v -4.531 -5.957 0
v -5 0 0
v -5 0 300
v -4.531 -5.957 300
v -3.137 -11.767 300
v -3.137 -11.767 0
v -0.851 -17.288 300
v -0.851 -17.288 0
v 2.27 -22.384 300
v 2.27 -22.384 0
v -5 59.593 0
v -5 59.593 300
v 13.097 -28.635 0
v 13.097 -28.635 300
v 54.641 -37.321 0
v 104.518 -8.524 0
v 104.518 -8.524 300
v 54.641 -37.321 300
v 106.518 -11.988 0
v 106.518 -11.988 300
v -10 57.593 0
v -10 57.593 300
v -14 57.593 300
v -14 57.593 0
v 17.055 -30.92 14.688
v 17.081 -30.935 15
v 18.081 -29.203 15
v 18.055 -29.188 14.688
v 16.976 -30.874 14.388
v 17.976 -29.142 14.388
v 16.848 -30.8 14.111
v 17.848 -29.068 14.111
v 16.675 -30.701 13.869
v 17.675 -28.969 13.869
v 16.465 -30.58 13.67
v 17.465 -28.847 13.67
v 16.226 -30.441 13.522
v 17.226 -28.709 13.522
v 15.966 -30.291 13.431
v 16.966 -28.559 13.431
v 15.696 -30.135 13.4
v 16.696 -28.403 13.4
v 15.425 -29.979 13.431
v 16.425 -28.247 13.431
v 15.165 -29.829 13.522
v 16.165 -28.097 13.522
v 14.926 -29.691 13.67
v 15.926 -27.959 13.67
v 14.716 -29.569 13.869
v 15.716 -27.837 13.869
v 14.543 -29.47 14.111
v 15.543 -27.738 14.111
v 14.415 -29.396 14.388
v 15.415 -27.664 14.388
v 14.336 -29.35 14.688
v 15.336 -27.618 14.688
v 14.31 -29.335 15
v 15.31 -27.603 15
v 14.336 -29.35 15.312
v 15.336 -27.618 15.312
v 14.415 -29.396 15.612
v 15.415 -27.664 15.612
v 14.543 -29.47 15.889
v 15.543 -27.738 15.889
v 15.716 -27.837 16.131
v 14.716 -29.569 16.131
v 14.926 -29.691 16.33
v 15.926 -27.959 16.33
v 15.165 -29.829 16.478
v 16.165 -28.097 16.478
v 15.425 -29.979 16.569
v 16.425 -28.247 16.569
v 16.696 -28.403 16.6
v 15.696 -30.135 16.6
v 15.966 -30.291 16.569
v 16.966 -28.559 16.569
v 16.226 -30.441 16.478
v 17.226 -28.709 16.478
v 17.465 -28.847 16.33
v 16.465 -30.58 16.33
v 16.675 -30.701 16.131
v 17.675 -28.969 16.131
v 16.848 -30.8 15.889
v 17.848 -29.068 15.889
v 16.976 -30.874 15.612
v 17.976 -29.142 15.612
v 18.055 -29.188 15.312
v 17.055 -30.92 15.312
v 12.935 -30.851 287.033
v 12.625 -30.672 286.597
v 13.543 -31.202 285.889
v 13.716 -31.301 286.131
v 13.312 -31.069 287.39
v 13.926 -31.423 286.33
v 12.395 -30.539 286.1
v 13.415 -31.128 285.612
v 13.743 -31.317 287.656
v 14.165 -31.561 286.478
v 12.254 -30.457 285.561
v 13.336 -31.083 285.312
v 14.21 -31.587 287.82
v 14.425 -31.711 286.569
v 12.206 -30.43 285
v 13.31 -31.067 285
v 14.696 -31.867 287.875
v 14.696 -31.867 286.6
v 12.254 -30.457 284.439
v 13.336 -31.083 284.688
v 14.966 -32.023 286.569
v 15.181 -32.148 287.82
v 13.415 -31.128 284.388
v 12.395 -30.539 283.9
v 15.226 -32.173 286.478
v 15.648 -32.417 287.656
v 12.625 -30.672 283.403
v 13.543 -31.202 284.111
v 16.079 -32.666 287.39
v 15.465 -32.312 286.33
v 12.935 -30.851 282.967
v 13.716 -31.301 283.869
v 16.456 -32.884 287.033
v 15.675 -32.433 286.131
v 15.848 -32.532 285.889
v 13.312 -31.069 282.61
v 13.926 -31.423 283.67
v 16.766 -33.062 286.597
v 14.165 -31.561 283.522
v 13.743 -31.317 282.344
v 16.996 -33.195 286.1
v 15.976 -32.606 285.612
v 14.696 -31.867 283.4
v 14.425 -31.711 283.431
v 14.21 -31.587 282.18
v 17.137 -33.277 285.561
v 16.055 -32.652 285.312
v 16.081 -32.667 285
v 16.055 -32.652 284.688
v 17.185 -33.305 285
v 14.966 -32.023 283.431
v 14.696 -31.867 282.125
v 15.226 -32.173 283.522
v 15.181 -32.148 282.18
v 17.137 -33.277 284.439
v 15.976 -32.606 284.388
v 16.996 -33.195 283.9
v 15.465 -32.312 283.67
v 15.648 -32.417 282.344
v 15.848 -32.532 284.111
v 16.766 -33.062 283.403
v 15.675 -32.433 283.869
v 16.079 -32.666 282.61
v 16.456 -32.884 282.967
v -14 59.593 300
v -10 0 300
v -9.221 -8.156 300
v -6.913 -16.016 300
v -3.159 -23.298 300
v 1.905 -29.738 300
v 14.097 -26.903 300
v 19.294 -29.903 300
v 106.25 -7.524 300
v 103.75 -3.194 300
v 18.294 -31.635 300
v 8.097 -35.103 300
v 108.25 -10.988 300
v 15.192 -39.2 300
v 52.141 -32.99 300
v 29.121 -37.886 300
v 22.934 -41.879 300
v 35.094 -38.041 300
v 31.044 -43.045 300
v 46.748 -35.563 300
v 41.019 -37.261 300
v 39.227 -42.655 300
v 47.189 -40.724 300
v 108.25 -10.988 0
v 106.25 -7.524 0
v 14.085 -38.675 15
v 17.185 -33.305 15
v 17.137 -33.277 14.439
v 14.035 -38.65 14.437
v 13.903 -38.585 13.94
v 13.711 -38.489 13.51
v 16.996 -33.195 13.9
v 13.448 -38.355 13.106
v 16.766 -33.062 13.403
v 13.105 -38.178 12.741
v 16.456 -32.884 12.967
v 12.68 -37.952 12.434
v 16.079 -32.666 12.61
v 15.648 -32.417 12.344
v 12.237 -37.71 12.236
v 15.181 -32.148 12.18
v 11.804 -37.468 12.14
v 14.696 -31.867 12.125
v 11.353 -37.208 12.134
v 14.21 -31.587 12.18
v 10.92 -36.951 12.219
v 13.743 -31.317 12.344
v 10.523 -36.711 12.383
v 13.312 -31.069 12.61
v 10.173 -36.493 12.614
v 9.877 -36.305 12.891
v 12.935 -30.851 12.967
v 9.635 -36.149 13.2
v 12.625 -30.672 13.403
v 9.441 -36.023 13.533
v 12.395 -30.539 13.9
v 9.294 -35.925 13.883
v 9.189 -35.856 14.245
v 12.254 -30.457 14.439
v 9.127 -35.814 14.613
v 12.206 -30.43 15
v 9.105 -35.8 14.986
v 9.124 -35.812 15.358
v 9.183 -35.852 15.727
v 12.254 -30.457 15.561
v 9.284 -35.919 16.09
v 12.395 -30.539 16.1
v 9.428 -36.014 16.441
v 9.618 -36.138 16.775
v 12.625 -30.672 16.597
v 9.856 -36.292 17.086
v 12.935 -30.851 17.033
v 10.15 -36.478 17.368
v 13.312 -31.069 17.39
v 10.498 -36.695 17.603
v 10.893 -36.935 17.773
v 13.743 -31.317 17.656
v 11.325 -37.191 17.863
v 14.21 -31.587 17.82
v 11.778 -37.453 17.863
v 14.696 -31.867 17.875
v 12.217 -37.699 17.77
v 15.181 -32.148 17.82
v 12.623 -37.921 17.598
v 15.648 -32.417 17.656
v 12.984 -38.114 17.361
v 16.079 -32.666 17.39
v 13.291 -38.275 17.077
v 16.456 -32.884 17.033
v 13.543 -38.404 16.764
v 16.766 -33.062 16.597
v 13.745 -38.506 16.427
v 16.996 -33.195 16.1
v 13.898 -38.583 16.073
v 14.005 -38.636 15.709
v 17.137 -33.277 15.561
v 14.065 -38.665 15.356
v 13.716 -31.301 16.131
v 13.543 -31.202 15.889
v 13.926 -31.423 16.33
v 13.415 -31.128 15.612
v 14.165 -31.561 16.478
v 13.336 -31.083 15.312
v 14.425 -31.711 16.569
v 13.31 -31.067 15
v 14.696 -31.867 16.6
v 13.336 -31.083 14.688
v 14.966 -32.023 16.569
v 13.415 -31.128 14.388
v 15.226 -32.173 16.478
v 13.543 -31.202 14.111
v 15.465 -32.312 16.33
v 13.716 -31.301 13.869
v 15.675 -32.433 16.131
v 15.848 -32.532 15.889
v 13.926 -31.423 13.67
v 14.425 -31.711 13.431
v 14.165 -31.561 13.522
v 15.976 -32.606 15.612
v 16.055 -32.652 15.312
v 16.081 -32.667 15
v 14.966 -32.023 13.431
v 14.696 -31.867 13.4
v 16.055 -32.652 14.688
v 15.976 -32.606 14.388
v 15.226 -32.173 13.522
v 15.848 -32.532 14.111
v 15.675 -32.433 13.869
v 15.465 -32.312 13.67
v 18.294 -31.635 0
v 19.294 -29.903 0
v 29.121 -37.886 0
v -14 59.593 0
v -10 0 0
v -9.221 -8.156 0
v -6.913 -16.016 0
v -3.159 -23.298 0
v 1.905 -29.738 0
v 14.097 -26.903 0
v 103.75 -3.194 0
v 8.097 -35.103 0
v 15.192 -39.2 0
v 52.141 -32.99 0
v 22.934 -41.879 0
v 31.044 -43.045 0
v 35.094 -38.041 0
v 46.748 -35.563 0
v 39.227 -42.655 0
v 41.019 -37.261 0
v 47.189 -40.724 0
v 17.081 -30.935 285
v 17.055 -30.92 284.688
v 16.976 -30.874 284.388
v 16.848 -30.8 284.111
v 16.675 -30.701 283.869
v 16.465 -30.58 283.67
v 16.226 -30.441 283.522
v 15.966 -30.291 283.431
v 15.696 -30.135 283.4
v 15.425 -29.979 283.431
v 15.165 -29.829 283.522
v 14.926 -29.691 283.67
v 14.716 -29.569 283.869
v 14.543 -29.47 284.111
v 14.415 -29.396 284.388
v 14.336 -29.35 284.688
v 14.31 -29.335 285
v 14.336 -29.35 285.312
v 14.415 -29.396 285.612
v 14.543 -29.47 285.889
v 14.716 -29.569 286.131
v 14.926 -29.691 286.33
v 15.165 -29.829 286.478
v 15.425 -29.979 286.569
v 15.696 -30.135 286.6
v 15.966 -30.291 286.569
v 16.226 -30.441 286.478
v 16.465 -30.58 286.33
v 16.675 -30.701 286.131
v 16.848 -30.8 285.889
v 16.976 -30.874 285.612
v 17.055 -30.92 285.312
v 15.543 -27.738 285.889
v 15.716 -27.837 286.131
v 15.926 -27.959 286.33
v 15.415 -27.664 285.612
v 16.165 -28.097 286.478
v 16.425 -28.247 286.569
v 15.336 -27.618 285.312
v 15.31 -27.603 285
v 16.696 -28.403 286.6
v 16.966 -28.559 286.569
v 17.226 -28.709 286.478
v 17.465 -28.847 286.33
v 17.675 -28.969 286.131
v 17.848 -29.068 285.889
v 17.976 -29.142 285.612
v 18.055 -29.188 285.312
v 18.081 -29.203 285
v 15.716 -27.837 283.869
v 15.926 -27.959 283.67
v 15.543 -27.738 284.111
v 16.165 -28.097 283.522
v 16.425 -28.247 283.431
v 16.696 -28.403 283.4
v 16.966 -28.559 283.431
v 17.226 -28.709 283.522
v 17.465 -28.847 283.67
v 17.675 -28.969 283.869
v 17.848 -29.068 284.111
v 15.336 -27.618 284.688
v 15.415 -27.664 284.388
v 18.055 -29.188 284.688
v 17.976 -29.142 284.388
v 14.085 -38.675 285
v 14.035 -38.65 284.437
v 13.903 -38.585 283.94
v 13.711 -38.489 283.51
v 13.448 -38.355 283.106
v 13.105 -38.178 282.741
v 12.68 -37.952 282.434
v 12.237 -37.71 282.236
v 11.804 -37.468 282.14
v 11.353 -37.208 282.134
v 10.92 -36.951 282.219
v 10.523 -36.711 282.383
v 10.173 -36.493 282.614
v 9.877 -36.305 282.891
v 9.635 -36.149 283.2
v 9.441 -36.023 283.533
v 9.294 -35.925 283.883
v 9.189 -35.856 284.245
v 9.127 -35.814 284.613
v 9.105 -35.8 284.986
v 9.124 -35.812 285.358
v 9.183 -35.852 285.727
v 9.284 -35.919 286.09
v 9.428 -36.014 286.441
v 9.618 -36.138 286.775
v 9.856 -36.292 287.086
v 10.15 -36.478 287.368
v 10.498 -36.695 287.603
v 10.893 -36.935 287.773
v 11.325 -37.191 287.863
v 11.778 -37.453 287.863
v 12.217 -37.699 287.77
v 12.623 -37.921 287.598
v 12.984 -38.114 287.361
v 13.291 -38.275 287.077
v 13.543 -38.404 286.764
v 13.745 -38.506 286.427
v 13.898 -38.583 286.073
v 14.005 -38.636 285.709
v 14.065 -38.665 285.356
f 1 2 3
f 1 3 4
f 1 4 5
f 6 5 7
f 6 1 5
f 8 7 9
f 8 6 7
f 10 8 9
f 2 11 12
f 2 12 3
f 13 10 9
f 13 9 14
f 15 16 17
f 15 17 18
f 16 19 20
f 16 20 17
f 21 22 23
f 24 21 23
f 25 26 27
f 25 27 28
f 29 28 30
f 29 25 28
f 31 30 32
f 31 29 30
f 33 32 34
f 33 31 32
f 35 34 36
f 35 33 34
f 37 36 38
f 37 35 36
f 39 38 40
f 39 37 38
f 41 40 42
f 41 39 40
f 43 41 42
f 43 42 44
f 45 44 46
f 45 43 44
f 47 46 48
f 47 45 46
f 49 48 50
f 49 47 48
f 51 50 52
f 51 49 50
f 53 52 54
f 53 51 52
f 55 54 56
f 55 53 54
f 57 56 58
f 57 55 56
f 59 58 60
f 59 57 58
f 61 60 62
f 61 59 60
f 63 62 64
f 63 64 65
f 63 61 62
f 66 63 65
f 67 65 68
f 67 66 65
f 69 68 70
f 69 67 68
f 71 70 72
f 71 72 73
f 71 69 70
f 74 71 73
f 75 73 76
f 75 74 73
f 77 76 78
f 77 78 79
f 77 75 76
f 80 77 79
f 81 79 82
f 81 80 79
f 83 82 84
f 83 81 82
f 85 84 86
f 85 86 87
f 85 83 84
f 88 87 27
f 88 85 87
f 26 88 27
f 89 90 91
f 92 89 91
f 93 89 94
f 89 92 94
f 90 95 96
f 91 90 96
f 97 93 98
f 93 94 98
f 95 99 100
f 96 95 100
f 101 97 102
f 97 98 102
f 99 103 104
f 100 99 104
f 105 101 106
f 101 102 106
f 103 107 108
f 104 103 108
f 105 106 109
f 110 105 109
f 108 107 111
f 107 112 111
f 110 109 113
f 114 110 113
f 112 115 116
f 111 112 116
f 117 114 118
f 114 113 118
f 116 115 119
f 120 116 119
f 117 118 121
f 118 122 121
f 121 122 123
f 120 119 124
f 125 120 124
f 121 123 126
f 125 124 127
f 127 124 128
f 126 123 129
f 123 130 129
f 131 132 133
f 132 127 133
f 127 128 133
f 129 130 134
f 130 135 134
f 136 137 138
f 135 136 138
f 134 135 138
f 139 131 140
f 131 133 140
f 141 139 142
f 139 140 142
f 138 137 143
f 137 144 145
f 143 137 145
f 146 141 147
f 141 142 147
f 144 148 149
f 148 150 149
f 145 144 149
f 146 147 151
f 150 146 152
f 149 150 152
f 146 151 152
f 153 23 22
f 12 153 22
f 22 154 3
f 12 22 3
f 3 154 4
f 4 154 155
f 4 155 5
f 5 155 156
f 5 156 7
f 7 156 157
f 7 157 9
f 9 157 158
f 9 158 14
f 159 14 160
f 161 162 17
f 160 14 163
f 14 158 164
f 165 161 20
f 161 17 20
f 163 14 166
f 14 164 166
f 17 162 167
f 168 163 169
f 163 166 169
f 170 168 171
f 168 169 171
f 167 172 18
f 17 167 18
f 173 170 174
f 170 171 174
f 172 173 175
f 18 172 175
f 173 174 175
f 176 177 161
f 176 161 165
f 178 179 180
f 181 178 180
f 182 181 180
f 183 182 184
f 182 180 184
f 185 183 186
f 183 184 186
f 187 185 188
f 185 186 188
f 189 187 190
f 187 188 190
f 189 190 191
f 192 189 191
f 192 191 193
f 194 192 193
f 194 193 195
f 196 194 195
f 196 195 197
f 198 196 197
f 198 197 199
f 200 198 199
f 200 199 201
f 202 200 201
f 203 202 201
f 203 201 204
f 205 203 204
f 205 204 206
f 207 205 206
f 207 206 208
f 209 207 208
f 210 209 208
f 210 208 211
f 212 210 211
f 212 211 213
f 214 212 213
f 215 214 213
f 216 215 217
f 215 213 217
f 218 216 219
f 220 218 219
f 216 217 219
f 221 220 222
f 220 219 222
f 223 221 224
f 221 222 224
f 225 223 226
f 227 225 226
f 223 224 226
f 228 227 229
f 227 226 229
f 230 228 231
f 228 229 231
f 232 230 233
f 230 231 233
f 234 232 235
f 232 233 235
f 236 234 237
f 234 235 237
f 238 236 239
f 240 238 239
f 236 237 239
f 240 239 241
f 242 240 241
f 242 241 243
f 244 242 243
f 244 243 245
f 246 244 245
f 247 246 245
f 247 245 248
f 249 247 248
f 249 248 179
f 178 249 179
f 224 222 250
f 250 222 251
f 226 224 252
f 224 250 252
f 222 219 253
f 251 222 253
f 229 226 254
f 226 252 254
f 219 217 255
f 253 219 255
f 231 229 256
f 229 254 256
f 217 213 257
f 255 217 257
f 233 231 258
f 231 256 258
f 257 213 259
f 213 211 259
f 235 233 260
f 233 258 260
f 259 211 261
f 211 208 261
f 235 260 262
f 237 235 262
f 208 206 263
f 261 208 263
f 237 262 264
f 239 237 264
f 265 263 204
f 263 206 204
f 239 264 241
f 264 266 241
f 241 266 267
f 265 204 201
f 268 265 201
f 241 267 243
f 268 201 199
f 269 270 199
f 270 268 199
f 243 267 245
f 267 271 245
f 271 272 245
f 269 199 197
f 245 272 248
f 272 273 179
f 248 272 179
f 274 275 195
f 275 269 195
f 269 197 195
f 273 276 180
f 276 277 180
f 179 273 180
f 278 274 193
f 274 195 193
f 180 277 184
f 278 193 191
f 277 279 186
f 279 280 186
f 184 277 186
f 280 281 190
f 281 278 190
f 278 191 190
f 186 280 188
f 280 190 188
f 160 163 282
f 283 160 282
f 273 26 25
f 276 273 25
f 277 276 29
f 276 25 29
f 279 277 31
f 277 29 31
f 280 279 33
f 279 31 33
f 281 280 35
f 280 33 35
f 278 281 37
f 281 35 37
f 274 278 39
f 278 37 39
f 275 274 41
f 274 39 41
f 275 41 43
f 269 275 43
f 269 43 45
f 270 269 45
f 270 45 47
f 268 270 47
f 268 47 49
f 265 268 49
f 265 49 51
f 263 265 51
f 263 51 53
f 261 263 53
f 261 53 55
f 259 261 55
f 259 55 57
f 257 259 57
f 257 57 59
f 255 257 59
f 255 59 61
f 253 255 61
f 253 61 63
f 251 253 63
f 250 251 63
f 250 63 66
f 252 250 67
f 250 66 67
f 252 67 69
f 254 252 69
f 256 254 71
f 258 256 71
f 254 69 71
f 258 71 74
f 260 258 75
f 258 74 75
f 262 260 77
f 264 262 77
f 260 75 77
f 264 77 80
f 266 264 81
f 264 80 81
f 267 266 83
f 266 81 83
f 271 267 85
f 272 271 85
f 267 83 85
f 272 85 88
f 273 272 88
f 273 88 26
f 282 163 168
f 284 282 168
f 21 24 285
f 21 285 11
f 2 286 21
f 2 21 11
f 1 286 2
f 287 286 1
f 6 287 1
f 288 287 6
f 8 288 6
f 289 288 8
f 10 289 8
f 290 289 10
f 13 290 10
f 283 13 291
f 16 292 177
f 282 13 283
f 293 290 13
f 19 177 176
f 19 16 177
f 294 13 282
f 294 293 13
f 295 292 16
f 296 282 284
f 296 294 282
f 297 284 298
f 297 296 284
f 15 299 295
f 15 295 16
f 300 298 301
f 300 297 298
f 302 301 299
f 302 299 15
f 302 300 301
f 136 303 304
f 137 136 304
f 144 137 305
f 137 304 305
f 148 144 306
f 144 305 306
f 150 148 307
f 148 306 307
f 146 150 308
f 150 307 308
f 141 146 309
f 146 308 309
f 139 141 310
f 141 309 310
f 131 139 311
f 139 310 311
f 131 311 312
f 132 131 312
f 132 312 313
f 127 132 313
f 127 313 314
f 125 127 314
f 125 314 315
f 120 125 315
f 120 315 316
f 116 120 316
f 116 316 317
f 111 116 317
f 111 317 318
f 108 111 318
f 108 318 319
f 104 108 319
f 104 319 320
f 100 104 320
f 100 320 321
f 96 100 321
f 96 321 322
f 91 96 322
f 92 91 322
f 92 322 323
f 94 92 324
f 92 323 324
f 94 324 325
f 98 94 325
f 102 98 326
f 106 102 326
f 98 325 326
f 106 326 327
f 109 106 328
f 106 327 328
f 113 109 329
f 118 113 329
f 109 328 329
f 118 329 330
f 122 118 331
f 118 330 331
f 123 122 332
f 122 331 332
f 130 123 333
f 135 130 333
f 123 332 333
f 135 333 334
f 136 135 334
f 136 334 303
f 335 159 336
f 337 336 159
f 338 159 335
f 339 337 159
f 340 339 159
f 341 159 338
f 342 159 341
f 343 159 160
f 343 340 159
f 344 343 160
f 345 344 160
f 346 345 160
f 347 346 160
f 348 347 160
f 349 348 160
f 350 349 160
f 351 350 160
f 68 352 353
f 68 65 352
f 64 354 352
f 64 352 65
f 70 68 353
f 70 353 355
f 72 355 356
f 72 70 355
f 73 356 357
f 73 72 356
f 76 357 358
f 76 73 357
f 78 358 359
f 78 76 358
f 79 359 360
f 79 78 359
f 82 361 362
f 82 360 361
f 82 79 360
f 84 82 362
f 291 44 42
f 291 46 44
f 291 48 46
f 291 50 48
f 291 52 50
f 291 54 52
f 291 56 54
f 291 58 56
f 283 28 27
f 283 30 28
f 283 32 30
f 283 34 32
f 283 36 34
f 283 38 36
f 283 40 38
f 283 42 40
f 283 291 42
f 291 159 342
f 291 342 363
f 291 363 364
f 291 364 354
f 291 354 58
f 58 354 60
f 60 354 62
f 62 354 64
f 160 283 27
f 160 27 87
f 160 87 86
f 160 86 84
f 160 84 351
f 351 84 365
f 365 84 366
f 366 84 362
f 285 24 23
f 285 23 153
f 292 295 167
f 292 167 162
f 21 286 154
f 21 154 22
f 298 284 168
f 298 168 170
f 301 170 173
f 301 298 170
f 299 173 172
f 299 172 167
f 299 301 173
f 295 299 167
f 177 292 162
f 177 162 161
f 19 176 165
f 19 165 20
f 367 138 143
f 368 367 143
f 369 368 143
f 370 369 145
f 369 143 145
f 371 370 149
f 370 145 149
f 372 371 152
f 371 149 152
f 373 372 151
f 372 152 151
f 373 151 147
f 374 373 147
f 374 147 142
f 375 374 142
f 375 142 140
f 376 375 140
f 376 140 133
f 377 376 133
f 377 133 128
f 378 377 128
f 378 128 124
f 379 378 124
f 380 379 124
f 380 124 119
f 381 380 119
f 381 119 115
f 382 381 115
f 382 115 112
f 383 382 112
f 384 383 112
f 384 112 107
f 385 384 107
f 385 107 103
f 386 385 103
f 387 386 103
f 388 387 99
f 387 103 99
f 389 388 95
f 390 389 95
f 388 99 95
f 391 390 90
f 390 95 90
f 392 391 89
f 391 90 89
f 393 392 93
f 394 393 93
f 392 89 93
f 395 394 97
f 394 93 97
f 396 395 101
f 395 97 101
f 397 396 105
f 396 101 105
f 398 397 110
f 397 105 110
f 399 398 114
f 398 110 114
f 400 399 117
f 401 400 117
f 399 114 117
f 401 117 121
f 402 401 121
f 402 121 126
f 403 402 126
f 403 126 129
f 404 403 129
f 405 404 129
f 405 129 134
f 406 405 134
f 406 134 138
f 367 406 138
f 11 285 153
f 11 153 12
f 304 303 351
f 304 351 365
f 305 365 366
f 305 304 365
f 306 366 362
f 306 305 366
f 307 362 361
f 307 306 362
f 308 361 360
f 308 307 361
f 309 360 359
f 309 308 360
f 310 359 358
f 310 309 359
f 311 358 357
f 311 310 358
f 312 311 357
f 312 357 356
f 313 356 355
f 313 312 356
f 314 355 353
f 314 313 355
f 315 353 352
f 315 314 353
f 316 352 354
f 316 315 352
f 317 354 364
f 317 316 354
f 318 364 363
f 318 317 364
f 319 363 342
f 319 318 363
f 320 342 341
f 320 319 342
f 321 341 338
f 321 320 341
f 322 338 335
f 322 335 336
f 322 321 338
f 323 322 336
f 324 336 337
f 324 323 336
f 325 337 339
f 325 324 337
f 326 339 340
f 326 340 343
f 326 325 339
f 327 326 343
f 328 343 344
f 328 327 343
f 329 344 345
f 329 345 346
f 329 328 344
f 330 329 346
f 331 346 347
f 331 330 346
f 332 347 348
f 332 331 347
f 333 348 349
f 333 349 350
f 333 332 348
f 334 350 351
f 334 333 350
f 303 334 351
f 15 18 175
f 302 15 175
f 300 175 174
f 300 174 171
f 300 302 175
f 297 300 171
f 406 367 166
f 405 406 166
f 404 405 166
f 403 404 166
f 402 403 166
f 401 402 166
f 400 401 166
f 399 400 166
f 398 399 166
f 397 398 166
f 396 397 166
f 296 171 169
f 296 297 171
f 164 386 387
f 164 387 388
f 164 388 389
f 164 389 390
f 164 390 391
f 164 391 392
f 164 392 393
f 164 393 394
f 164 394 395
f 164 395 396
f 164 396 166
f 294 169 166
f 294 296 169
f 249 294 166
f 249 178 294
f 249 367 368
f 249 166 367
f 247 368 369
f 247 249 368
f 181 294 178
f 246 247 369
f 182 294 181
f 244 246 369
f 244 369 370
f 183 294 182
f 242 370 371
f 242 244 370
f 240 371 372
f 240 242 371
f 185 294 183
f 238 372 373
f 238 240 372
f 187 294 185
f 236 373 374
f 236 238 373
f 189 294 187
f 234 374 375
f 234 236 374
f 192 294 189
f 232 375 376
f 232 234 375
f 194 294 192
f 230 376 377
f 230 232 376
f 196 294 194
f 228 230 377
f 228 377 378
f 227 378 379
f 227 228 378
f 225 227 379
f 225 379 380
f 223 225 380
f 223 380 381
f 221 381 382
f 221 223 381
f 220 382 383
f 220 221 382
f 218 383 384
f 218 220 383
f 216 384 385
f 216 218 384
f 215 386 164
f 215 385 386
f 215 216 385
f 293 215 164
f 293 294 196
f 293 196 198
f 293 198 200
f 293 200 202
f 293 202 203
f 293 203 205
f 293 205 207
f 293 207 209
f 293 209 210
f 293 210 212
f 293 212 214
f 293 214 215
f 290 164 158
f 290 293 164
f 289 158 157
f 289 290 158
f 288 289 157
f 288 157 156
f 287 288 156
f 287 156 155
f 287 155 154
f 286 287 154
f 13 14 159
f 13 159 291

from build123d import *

# Parameters (mm, degrees)
BOSS_EXTRUDE1_DEPTH = 300
SKETCH3_R           = 1.6
CUT_EXTRUDE1_DEPTH  = 27.070508076
CUT_EXTRUDE2_START  = -2
SKETCH4_R           = 2.875
CUT_EXTRUDE2_DEPTH  = 25.070508162
SKETCH5_W           = 6
SKETCH5_H           = 300
SKETCH5_R           = 1.6
BOSS_EXTRUDE2_DEPTH = 2


with BuildPart() as part:
    # Sketch2 → Boss-Extrude1 (new body)
    with BuildSketch(Plane.XY):
        with BuildLine():
            Line((-10, 0), (-10, 57.592991829))
            Line((-10, 57.592991829), (-14, 57.592991829))
            Line((-14, 57.592991829), (-14, 59.592991829))
            Line((-14, 59.592991829), (-10, 59.592991829))
            Line((-10, 59.592991829), (-5, 59.592991829))
            Line((-5, 59.592991829), (-5, 0))
            ThreePointArc((-5, 0), (-3.13691529, -11.76748288), (2.270101024, -22.383928263))
            Line((2.270101024, -22.383928263), (29.120915128, -37.886253013))
            ThreePointArc((29.120915128, -37.886253013), (41.018534684, -37.260643809), (52.141016151, -32.990381057))
            Line((52.141016151, -32.990381057), (103.750060963, -3.193885142))
            Line((103.750060963, -3.193885142), (106.250060963, -7.524012161))
            Line((106.250060963, -7.524012161), (108.250060963, -10.988113776))
            Line((108.250060963, -10.988113776), (106.518010155, -11.988113776))
            Line((106.518010155, -11.988113776), (104.518010155, -8.524012161))
            Line((104.518010155, -8.524012161), (54.641016151, -37.320508076))
            ThreePointArc((54.641016151, -37.320508076), (11.547005384, -37.320508076), (-10, 0))
        make_face()
    extrude(amount=BOSS_EXTRUDE1_DEPTH)

    # Sketch3 → Cut-Extrude1 (cut, through all)
    with BuildSketch(Plane(origin=(-9.125, -15.804963619, 0), x_dir=(0.866025404, -0.5, 0), z_dir=(0.5, 0.866025404, 0))):
        with Locations((28.660254038, -15)):
            Circle(SKETCH3_R)
        with Locations((28.660254038, -285)):
            Circle(SKETCH3_R)
    extrude(amount=-CUT_EXTRUDE1_DEPTH, mode=Mode.SUBTRACT)

    # Sketch4 → Cut-Extrude2 (cut, through all)
    with BuildSketch(Plane(origin=(-9.125, -15.804963619, 0), x_dir=(0.866025404, -0.5, 0), z_dir=(0.5, 0.866025404, 0)).offset(CUT_EXTRUDE2_START)):
        with Locations((28.660254038, -15)):
            Circle(SKETCH4_R)
        with Locations((28.660254038, -285)):
            Circle(SKETCH4_R)
    extrude(amount=-CUT_EXTRUDE2_DEPTH, mode=Mode.SUBTRACT)

    # Sketch5 → Boss-Extrude2 (add)
    with BuildSketch(Plane(origin=(-9.125, -15.804963619, 0), x_dir=(0.866025404, -0.5, 0), z_dir=(0.5, 0.866025404, 0))):
        with Locations((28.660254038, -150)):
            Rectangle(SKETCH5_W, SKETCH5_H)
        with Locations((28.660254038, -15)):
            Circle(SKETCH5_R, mode=Mode.SUBTRACT)
        with Locations((28.660254038, -285)):
            Circle(SKETCH5_R, mode=Mode.SUBTRACT)
    extrude(amount=BOSS_EXTRUDE2_DEPTH)


solid = part.part
